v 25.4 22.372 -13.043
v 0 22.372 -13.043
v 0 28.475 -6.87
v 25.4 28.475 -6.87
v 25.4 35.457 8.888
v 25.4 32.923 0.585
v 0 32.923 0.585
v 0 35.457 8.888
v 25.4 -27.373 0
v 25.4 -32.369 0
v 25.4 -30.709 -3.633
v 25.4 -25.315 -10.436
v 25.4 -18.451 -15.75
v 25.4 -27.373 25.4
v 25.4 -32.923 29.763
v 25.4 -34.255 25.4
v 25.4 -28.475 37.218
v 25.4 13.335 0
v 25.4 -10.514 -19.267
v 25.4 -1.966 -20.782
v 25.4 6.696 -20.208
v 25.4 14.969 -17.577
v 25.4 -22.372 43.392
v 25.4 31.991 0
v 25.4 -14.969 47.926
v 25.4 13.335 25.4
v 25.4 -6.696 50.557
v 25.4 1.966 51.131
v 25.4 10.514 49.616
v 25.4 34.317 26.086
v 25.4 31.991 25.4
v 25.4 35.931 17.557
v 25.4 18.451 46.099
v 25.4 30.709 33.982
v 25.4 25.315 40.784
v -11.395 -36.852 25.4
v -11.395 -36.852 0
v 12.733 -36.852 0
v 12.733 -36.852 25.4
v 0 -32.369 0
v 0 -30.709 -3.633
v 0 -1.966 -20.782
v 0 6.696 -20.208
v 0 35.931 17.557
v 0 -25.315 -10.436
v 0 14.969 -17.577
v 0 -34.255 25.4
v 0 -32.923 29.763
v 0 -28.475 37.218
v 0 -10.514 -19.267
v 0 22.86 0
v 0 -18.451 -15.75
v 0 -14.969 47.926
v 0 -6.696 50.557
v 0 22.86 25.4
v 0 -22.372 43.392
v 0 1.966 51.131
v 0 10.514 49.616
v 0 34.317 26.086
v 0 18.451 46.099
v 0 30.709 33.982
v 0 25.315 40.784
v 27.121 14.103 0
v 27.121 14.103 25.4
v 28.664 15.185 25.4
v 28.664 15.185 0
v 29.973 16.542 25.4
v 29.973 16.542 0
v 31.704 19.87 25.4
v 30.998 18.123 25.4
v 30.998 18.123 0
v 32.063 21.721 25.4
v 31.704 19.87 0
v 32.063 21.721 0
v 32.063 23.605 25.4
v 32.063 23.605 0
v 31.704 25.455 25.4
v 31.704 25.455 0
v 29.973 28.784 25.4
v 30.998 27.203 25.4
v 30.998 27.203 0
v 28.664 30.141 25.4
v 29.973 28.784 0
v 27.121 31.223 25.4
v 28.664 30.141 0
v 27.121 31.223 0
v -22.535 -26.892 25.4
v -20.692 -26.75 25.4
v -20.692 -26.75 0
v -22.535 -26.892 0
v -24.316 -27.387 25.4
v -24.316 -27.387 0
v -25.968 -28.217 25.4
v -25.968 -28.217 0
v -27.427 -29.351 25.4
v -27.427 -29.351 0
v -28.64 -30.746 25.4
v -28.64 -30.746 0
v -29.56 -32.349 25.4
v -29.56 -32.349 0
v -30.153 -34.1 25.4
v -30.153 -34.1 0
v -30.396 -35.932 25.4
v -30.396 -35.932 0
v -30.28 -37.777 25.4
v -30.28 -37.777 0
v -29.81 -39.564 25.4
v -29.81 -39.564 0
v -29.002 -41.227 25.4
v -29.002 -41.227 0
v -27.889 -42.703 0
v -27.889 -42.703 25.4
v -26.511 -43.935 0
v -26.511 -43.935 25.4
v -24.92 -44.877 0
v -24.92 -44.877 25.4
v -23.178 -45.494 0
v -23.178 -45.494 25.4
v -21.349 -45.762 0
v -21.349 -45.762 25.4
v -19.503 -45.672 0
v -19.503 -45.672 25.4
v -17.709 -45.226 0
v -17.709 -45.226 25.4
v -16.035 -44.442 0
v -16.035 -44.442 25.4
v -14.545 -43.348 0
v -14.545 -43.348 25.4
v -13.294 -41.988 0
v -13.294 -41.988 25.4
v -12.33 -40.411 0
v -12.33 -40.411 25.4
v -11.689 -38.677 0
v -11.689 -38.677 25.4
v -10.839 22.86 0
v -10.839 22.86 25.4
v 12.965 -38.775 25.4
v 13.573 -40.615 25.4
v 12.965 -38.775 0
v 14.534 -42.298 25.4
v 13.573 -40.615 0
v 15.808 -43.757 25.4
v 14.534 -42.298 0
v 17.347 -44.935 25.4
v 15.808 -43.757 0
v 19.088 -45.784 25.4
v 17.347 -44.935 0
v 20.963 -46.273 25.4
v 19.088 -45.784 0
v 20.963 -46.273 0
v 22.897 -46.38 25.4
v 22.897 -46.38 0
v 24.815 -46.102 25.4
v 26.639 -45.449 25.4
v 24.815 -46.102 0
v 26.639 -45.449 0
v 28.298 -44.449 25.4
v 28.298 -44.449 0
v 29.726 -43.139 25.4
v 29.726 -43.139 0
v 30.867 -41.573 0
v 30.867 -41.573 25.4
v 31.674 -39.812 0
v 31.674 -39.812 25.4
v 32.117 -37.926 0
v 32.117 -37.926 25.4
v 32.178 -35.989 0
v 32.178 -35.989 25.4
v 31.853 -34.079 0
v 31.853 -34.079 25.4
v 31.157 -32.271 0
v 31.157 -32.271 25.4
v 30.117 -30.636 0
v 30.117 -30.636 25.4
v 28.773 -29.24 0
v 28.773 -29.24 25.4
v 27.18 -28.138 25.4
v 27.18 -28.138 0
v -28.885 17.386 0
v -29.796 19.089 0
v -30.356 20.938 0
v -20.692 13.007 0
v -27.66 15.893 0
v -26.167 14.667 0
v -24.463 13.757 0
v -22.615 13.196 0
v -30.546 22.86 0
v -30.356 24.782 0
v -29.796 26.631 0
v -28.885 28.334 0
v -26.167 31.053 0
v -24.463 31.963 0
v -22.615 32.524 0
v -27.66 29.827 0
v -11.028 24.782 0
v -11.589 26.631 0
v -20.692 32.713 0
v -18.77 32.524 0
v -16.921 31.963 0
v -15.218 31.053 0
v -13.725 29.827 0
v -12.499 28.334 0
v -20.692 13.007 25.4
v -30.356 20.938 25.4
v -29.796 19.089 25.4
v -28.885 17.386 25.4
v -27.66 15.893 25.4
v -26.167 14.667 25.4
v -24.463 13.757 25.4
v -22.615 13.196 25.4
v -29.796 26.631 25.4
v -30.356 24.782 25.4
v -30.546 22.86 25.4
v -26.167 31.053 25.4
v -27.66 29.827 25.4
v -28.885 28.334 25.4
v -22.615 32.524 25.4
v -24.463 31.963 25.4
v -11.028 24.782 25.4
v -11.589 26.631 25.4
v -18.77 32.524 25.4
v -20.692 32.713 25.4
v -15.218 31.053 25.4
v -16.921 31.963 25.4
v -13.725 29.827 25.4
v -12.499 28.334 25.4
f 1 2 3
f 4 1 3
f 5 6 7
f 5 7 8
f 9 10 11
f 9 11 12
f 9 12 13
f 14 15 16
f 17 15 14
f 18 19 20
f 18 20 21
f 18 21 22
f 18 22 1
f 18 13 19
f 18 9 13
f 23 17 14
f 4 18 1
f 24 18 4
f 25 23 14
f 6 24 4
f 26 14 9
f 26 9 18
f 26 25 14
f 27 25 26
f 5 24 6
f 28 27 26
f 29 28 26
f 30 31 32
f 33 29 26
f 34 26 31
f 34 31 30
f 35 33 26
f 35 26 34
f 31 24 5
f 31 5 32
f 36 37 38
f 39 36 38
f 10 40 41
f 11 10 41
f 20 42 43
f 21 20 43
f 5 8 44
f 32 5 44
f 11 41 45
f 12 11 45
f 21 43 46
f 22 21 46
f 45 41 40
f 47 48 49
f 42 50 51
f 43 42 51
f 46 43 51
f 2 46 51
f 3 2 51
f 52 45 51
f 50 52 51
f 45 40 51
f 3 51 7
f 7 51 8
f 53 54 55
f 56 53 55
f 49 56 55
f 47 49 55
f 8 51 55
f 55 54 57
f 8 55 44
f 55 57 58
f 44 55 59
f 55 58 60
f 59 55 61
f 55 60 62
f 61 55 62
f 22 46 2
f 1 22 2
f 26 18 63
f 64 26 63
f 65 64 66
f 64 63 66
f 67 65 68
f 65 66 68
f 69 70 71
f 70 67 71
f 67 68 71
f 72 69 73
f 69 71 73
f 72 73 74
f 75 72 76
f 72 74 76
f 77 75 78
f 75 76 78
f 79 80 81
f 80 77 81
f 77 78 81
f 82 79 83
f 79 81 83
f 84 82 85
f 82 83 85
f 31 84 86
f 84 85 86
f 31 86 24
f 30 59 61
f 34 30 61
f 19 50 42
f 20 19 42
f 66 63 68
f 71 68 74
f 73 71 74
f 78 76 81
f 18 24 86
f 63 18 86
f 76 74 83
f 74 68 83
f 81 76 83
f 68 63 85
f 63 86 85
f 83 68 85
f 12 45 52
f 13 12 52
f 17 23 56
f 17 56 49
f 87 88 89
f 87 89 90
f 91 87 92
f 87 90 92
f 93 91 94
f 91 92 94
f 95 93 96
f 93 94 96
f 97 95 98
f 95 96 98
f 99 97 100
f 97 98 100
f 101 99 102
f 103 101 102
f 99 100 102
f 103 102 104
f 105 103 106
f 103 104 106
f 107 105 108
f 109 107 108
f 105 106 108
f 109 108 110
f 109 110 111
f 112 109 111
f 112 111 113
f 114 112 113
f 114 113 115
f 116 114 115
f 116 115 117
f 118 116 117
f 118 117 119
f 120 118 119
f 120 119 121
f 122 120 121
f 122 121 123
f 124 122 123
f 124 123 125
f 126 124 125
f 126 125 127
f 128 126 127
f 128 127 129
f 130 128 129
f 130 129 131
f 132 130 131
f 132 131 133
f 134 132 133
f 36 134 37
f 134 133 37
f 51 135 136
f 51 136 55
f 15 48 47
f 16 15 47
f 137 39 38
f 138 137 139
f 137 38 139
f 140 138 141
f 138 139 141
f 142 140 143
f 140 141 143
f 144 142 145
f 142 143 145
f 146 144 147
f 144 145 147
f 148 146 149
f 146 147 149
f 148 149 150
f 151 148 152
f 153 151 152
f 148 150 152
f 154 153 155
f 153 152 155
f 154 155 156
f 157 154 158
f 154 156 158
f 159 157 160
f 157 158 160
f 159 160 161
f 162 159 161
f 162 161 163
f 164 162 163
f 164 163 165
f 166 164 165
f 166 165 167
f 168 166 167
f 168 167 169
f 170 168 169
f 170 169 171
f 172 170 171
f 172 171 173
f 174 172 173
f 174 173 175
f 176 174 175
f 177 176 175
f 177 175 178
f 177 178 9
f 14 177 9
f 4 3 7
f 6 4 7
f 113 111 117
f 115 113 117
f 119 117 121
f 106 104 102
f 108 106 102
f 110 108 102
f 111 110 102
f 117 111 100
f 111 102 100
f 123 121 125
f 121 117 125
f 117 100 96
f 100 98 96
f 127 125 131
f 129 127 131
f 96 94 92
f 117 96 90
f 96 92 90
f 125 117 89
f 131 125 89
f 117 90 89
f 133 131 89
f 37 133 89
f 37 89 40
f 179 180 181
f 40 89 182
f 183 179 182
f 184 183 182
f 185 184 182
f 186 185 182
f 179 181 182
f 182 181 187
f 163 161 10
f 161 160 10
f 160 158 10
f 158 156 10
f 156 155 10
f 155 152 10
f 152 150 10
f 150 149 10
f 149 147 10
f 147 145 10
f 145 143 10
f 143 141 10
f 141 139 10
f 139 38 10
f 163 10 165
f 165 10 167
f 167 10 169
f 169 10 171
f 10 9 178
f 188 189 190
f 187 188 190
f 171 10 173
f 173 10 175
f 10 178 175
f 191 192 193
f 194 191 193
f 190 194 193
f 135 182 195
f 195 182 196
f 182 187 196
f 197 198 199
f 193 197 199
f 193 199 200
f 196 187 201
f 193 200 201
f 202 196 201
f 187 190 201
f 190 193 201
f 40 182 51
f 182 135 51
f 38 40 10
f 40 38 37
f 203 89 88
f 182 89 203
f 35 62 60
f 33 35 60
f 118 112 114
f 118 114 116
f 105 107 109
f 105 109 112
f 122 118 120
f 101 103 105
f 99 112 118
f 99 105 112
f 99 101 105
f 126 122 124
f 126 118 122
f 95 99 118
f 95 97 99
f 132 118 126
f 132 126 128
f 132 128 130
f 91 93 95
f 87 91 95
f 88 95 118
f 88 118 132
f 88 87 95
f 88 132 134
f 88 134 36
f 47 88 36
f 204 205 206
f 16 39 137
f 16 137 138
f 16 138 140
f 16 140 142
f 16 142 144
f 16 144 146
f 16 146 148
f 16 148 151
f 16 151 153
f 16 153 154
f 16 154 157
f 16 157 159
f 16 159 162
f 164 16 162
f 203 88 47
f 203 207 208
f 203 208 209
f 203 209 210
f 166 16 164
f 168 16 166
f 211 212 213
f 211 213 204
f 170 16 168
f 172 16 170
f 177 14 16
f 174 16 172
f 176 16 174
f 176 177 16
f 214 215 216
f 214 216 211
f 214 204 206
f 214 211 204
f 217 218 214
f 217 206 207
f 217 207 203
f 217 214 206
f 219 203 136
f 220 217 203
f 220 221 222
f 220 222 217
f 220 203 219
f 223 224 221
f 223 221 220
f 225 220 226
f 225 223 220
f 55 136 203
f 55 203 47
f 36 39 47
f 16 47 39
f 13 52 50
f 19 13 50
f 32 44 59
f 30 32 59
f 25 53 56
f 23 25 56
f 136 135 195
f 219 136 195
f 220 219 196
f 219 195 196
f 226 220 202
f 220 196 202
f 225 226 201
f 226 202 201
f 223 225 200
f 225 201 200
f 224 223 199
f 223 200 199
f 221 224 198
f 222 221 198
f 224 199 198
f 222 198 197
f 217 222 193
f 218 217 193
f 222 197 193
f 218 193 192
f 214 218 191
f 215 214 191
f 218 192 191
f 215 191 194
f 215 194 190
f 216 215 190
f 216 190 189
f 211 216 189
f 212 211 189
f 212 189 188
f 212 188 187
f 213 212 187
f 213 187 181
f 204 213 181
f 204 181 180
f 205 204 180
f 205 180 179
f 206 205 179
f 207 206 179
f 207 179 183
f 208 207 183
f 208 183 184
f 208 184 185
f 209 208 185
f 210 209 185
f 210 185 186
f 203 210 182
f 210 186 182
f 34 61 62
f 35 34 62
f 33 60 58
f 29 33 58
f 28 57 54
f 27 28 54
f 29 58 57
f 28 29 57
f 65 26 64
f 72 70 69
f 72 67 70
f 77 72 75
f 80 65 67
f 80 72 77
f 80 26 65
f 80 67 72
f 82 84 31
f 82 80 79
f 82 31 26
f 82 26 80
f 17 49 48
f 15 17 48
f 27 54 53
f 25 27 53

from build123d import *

# Parameters (mm, degrees)
F0_W     = 42.961035
F0_H     = 59.7119
F1_DEPTH = 25.4
F2_R     = 9.839641
F2_R_2   = 9.85345
F2_R_3   = 9.734491
F2_R_4   = 9.512534
F3_DEPTH = 25.4
F5_DEPTH = 25.4


with BuildPart() as f1:
    # F0 (on Top) → F1 (new body)
    with BuildSketch(Plane.XY):
        with Locations((0.788275, -6.995948)):
            Rectangle(F0_W, F0_H)
    extrude(amount=F1_DEPTH)

    # F2 (on Top) → F3 (join)
    with BuildSketch(Plane.XY):
        with Locations((22.268793, 22.66293)):
            Circle(F2_R)
        with Locations((-20.692242, 22.860002)):
            Circle(F2_R_2)
        with Locations((22.465866, -36.654826)):
            Circle(F2_R_3)
        with Locations((-20.889312, -36.260691)):
            Circle(F2_R_4)
    extrude(amount=F3_DEPTH)

    # F4 (on Right) → F5 (join)
    with BuildSketch(Plane.YZ):
        Polygon((-1.96623, -20.782315), (6.695889, -20.20803), (14.968867, -17.577453), (22.371909, -13.043462), (28.474777, -6.869556), (32.922794, 0.585458), (35.457458, 8.888324), (35.931464, 17.556509), (34.317264, 26.086249), (30.708669, 33.981826), (25.315398, 40.784379), (18.450887, 46.098569), (10.514079, 49.615552), (1.96623, 51.130936), (-6.695889, 50.556652), (-14.968867, 47.926074), (-22.371909, 43.392083), (-28.474777, 37.218178), (-32.922794, 29.763163), (-35.457458, 21.460297), (-35.931464, 12.792113), (-34.317264, 4.262373), (-30.708669, -3.633205), (-25.315398, -10.435758), (-18.450887, -15.749947), (-10.514079, -19.266931), align=None)
    extrude(amount=F5_DEPTH)


solid = f1.part
